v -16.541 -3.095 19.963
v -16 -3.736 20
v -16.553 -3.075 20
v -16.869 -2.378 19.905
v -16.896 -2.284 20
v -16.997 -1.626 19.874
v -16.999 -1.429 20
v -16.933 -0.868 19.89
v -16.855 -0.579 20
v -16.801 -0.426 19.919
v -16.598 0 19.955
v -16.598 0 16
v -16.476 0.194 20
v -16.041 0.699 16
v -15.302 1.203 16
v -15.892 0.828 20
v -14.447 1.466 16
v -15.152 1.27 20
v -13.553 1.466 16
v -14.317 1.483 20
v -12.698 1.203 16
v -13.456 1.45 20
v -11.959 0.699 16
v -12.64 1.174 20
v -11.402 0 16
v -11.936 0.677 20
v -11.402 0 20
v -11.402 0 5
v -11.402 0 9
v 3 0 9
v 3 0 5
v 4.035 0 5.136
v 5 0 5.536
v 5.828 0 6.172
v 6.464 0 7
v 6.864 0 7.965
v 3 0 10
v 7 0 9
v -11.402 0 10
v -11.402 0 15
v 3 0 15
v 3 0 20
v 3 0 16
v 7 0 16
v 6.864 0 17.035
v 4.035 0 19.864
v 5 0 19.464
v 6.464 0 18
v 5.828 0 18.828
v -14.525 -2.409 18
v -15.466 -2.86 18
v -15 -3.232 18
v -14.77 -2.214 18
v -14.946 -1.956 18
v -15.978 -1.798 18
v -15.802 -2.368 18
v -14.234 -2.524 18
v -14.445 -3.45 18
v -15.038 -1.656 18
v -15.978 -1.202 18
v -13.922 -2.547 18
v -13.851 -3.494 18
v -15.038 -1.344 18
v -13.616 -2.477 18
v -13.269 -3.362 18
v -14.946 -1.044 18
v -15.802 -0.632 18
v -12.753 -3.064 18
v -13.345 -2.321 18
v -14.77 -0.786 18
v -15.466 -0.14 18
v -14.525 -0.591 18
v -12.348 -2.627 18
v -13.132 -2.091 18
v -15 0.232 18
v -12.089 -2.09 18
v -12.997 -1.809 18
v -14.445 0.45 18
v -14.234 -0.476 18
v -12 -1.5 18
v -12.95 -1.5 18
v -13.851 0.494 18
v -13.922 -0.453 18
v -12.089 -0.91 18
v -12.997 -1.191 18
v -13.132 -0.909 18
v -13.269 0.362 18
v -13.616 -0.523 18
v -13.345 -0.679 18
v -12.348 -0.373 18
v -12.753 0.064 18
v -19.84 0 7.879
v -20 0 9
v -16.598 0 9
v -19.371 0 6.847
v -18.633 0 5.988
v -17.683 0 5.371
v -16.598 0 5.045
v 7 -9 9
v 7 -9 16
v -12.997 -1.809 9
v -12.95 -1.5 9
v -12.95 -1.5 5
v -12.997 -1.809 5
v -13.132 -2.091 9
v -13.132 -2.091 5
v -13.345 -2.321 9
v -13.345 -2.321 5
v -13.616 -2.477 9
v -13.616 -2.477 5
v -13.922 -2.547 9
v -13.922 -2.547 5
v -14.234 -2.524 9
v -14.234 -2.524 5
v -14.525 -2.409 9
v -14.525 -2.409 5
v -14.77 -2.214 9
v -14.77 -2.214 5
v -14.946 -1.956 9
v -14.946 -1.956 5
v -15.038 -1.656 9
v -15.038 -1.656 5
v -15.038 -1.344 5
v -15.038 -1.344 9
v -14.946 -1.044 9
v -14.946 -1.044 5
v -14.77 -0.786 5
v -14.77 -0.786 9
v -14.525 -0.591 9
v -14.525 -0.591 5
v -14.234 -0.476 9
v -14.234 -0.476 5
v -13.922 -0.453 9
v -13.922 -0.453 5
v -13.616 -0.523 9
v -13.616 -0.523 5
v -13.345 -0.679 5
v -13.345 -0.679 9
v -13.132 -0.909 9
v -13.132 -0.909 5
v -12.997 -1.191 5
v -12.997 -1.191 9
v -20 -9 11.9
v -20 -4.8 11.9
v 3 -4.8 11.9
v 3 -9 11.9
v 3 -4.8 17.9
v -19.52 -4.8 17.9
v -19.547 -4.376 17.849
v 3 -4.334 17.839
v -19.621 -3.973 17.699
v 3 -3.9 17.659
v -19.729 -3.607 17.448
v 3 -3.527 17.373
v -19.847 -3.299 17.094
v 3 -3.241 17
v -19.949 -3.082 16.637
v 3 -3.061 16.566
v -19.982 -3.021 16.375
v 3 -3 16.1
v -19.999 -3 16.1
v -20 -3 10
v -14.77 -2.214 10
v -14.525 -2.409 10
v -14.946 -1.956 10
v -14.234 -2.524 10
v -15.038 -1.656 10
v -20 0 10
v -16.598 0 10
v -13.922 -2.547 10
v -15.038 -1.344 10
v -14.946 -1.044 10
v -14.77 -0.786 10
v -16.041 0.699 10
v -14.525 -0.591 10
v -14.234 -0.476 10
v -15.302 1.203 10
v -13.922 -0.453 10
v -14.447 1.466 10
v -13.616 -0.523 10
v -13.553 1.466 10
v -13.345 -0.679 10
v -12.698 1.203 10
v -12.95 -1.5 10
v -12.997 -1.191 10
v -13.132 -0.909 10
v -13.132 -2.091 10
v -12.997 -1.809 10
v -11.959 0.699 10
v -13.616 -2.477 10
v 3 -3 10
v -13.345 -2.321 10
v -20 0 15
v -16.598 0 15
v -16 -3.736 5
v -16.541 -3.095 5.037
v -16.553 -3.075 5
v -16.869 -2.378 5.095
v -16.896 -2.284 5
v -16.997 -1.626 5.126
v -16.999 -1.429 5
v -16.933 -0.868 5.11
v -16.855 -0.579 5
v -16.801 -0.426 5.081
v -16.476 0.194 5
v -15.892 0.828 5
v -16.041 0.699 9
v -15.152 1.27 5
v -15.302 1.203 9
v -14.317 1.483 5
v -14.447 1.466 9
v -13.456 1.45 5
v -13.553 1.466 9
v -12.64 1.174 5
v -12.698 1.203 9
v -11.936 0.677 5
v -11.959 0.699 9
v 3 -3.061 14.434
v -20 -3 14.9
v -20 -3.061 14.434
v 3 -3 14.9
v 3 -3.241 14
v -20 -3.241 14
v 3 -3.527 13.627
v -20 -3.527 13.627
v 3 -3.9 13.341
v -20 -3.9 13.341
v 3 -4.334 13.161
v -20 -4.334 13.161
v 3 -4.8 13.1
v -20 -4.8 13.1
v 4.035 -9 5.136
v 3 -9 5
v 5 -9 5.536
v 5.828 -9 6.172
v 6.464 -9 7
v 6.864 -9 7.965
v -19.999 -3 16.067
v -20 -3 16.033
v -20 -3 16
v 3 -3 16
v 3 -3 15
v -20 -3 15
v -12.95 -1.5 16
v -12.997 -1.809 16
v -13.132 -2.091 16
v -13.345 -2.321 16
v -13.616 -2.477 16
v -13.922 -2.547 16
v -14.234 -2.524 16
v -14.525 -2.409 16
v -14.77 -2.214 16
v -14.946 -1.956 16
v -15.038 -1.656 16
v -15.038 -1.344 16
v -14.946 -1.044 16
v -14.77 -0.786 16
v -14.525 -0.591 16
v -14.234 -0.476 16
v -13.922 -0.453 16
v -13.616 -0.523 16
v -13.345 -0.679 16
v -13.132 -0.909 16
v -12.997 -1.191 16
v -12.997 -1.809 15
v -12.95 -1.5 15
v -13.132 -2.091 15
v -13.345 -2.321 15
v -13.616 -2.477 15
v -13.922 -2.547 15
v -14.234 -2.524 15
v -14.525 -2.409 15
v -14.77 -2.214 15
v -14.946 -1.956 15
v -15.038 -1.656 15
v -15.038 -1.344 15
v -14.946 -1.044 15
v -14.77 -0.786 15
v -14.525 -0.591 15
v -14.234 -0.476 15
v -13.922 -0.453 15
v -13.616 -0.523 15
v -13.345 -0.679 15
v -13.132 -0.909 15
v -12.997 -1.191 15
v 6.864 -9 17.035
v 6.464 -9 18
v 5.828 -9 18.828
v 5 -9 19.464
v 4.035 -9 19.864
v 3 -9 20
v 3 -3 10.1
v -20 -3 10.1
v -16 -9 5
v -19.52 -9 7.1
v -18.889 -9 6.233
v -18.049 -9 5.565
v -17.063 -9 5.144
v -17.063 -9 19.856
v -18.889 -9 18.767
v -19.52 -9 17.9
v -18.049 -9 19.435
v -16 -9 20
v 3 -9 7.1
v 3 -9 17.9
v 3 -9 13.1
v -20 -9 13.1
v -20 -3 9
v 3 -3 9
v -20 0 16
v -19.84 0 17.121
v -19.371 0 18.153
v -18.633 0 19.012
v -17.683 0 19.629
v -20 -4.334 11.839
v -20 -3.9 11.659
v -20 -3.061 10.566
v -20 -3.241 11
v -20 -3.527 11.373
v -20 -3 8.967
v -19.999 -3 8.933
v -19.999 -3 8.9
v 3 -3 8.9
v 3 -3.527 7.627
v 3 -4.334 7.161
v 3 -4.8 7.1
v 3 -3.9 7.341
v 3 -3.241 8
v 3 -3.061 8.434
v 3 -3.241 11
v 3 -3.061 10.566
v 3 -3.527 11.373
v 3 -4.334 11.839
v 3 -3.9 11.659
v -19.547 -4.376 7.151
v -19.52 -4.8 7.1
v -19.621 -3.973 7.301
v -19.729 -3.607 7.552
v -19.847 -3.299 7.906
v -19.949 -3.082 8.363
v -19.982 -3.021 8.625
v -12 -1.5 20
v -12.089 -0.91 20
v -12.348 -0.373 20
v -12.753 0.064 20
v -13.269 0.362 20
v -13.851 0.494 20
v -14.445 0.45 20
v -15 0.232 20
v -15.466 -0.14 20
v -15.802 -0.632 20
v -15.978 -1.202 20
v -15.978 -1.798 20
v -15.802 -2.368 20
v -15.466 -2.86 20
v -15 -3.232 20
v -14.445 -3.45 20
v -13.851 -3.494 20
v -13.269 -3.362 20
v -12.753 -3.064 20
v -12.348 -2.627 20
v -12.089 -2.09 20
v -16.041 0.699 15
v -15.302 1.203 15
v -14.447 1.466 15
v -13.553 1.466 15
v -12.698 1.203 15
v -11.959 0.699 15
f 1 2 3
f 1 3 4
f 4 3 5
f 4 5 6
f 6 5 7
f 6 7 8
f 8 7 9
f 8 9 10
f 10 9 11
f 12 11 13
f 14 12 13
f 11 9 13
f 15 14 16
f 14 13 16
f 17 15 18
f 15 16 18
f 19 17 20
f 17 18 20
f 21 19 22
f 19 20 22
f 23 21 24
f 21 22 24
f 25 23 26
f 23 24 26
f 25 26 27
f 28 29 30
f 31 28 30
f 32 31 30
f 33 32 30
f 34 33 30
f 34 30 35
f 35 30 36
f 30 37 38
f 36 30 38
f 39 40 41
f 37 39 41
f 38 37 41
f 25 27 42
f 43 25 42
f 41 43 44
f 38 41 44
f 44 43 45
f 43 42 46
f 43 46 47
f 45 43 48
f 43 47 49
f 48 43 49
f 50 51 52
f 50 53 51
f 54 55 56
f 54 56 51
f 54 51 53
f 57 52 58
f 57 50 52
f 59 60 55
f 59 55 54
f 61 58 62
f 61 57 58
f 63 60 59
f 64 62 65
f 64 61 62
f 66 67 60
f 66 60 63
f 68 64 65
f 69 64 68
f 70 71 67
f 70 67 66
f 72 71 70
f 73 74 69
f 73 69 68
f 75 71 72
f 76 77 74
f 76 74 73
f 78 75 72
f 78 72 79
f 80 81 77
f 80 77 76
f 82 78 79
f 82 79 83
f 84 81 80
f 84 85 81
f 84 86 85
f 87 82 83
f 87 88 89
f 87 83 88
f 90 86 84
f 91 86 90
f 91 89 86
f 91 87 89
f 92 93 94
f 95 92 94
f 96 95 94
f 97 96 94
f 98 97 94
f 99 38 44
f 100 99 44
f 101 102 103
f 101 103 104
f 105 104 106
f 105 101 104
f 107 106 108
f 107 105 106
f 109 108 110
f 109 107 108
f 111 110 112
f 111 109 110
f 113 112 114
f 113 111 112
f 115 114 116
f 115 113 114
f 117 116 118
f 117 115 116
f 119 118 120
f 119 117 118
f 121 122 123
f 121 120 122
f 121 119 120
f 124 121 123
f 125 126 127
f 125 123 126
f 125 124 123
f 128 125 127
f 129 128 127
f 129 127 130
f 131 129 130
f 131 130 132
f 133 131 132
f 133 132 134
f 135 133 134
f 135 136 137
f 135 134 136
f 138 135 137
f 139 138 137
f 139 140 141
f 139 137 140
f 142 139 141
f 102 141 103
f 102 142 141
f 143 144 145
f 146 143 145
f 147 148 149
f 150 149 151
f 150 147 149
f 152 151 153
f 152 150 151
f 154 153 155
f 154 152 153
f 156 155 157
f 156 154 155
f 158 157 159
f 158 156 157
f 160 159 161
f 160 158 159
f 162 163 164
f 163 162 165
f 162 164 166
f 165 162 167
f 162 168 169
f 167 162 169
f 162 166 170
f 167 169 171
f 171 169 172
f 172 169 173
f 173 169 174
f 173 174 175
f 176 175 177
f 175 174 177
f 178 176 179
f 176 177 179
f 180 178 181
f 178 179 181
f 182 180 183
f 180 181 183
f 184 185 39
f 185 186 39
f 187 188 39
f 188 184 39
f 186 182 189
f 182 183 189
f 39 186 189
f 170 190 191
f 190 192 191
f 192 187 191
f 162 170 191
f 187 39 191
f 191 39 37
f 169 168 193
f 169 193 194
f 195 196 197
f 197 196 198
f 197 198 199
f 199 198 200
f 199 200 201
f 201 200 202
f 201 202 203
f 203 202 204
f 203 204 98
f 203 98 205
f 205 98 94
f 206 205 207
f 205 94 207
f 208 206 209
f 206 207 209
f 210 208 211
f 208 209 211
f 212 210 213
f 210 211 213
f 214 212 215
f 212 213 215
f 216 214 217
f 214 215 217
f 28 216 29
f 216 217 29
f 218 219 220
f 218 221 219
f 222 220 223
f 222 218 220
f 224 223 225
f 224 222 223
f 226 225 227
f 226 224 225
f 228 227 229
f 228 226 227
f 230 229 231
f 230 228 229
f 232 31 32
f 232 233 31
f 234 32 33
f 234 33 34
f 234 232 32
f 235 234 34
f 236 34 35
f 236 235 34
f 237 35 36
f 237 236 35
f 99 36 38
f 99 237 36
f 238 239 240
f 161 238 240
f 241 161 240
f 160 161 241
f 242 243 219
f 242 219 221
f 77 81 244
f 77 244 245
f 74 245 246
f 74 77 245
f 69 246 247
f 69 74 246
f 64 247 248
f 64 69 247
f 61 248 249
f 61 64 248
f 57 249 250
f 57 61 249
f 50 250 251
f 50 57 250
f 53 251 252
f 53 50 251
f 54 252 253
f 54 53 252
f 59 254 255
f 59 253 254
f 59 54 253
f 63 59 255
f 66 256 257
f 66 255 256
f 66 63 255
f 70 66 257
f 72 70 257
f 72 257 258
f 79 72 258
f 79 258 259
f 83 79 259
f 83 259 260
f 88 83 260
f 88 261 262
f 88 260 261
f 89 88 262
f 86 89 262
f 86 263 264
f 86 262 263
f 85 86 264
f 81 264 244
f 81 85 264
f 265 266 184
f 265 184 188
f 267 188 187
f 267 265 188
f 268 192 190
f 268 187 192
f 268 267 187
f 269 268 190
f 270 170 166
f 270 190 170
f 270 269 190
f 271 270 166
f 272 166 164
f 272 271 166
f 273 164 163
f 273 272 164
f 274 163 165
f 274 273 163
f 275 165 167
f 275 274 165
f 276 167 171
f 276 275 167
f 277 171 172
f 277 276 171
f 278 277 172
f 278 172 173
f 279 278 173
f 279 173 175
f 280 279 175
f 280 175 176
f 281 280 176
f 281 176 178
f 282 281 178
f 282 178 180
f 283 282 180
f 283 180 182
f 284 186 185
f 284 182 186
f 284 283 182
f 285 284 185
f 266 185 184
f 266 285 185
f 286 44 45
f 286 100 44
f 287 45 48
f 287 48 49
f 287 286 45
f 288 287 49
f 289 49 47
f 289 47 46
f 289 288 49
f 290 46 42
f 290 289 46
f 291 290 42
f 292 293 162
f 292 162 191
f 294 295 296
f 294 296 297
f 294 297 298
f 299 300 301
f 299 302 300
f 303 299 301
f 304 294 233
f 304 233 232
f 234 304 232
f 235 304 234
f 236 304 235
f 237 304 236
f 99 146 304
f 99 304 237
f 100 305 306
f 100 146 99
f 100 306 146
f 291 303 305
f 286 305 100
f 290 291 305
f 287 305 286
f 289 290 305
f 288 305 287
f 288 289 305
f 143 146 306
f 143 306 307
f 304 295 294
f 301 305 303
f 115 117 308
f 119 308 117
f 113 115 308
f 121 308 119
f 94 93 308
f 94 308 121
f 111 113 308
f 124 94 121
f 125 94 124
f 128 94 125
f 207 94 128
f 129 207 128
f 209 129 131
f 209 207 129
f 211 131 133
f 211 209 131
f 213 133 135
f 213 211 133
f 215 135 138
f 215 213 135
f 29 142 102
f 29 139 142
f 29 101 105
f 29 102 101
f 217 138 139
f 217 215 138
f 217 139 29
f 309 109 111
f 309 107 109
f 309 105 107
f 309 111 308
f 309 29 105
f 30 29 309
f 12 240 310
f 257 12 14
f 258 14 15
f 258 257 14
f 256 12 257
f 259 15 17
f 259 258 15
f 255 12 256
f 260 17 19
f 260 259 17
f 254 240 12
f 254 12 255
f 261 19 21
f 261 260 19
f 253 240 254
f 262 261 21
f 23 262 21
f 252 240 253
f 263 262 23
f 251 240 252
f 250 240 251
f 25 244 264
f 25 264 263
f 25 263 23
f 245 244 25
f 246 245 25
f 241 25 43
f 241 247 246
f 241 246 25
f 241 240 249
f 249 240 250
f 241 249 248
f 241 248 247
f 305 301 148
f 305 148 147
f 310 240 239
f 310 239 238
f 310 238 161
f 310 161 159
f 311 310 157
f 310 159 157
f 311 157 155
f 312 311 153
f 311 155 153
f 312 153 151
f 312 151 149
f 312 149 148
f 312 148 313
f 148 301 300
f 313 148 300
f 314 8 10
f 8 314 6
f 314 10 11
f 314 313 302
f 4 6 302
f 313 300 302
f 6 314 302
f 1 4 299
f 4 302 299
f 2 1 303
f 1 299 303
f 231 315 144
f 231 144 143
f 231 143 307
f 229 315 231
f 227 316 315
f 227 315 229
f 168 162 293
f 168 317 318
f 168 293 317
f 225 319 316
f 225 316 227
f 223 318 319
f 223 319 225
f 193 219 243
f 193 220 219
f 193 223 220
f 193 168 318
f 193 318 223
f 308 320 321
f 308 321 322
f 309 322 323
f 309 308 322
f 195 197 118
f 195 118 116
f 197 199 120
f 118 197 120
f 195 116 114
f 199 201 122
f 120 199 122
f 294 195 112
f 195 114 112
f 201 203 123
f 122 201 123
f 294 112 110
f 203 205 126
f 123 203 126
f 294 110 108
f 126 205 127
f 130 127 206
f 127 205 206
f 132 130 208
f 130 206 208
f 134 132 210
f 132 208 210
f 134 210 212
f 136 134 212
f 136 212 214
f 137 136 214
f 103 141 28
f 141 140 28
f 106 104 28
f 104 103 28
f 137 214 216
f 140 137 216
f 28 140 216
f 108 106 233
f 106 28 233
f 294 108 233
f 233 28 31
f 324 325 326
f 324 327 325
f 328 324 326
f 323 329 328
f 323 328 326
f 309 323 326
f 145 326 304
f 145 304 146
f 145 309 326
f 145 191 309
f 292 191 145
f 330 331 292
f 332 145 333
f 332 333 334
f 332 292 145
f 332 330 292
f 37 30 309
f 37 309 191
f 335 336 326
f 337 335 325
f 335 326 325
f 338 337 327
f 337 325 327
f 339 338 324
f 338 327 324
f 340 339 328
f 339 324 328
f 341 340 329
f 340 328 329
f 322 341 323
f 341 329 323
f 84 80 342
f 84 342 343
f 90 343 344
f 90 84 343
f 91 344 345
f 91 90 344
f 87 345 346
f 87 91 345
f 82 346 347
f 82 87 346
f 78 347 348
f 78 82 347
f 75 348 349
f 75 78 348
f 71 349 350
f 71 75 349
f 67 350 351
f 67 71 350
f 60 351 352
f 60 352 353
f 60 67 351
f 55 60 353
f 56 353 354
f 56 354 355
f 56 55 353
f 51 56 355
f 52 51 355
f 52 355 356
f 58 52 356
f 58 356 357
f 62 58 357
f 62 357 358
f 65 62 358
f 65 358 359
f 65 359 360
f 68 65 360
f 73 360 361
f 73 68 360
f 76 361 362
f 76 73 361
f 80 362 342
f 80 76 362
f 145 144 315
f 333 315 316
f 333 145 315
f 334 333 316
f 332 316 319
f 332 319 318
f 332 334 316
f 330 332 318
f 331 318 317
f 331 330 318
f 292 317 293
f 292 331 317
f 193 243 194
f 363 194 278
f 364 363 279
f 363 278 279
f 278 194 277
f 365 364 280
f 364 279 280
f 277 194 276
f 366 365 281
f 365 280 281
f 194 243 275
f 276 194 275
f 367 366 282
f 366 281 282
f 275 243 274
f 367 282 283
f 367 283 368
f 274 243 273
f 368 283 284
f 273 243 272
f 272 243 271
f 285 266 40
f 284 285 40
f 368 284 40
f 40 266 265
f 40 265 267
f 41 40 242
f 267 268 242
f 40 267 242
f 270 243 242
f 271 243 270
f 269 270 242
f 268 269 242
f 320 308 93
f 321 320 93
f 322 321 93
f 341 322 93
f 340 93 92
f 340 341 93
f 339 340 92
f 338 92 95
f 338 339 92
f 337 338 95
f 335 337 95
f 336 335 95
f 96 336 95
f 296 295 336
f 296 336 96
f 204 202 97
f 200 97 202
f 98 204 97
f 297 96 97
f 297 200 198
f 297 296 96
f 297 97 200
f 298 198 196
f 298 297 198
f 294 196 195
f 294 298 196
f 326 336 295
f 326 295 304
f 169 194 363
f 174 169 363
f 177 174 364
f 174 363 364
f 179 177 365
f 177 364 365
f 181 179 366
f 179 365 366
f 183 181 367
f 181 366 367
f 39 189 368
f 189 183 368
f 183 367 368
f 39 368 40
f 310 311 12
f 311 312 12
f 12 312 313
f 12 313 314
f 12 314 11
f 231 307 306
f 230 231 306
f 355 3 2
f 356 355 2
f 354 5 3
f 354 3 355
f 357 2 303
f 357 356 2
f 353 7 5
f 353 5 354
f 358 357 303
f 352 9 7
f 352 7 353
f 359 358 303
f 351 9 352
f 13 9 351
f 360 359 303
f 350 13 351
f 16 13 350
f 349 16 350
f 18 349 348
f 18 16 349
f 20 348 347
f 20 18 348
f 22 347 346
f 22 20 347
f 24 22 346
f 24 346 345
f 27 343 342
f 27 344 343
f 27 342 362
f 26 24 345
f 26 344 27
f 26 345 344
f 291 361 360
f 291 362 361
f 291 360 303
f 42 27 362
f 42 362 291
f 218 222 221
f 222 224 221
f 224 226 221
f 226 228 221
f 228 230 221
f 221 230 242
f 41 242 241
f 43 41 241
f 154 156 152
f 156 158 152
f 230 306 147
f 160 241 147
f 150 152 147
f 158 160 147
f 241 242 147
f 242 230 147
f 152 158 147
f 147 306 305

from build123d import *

# Parameters (mm, degrees)
CYLINDER002_R          = 2
CYLINDER002_DEPTH      = 2
CYLINDER_R             = 1.05
CYLINDER_DEPTH         = 20
CYLINDER_ROLL_ANGLE    = 90
RECTANGLE004_W         = 26
RECTANGLE004_H         = 4.8
EXTRUDE005_DEPTH       = 8
RECTANGLE002_W         = 26
RECTANGLE002_H         = 1
EXTRUDE004_DEPTH       = 20
RECTANGLE005_W         = 26
RECTANGLE005_H         = 4.8
EXTRUDE008_DEPTH       = 8
RECTANGLE001_W         = 26
RECTANGLE001_H         = 1
EXTRUDE002_DEPTH       = 20
RECTANGLE_W            = 27
RECTANGLE_H            = 15
EXTRUDE_DEPTH          = 9
FILLET_R               = 4
FILLET001_R            = 1.8
RECTANGLE008_W         = 26
RECTANGLE008_H         = 4.8
EXTRUDE011_DEPTH       = 8
RECTANGLE007_W         = 26
RECTANGLE007_H         = 1
EXTRUDE010_DEPTH       = 20
RECTANGLE009_W         = 26
RECTANGLE009_H         = 4.8
EXTRUDE012_DEPTH       = 8
RECTANGLE006_W         = 26
RECTANGLE006_H         = 1
EXTRUDE009_DEPTH       = 20
CYLINDER001_R          = 3
CYLINDER001_DEPTH      = 15
CYLINDER001_ROLL_ANGLE = 90
CUT002_ROLL_ANGLE      = 90


with BuildPart() as cylinder002:
    # Cylinder002 → Cylinder002 (new body)
    with BuildSketch(Plane(origin=(-14, -1.5, 18), x_dir=(1, 0, 0), z_dir=(0, 0, 1))):
        Circle(CYLINDER002_R)
    extrude(amount=CYLINDER002_DEPTH)


with BuildPart() as cylinder:
    # Cylinder → Cylinder (new body)
    with BuildSketch(Plane.XY):
        Circle(CYLINDER_R)
    extrude(amount=CYLINDER_DEPTH)


with BuildPart() as cylinder_1:
    # Cylinder roll: moved
    add(cylinder.part.rotate(Axis((0, 0, 0), (1, 0, 0)), CYLINDER_ROLL_ANGLE))


with BuildPart() as cylinder_2:
    # Cylinder placement: moved
    add(cylinder_1.part.moved(Location((-14, 21, 1.5))))


with BuildPart() as extrude005:
    # Rectangle004 → Extrude005 (new body)
    with BuildSketch(Plane(origin=(-23, 13.1, 0), x_dir=(1, 0, 0), z_dir=(0, 0, 1))):
        with Locations((13, 2.4)):
            Rectangle(RECTANGLE004_W, RECTANGLE004_H)
    extrude(amount=-EXTRUDE005_DEPTH)


with BuildPart() as extrude005_1:
    # Extrude005 placement: moved
    add(extrude005.part.moved(Location((0, 0, 11))))


with BuildPart() as extrude004:
    # Rectangle002 → Extrude004 (new body)
    with BuildSketch(Plane(origin=(-23, 10, 0), x_dir=(1, 0, 0), z_dir=(0, 0, 1))):
        with Locations((13, -0.5)):
            Rectangle(RECTANGLE002_W, RECTANGLE002_H)
    extrude(amount=EXTRUDE004_DEPTH)


with BuildPart() as extrude004_1:
    # Extrude004 placement: moved
    add(extrude004.part.moved(Location((0, 0, -4))))


with BuildPart() as extrude008:
    # Rectangle005 → Extrude008 (new body)
    with BuildSketch(Plane(origin=(-23, 11.9, 0), x_dir=(1, 0, 0), z_dir=(0, 0, 1))):
        with Locations((13, -2.4)):
            Rectangle(RECTANGLE005_W, RECTANGLE005_H)
    extrude(amount=EXTRUDE008_DEPTH)


with BuildPart() as extrude008_1:
    # Extrude008 placement: moved
    add(extrude008.part.moved(Location((0, 0, 3))))


with BuildPart() as fusion:
    # Rectangle001 → Extrude002 (new body)
    with BuildSketch(Plane(origin=(-23, 16, 0), x_dir=(1, 0, 0), z_dir=(0, 0, 1))):
        with Locations((13, 0.5)):
            Rectangle(RECTANGLE001_W, RECTANGLE001_H)
    extrude(amount=-EXTRUDE002_DEPTH)


with BuildPart() as fusion_1:
    # Extrude002 placement: moved
    add(fusion.part.moved(Location((0, -1, 10))))

    # Fusion: union Extrude005, Extrude004, Extrude008
    add(extrude005_1.part)
    add(extrude004_1.part)
    add(extrude008_1.part)


with BuildPart() as fillet001:
    # Rectangle → Extrude (new body)
    with BuildSketch(Plane(origin=(-20, 20, 0), x_dir=(1, 0, 0), z_dir=(0, 0, 1))):
        with Locations((13.5, -7.5)):
            Rectangle(RECTANGLE_W, RECTANGLE_H)
    extrude(amount=EXTRUDE_DEPTH)

    # Fillet
    fillet_edges = [fillet001.edges().sort_by_distance(p)[0] for p in [
        (-20, 20, 4.5),
        (7, 20, 4.5),
        (7, 5, 4.5),
        (-20, 5, 4.5),
    ]]
    fillet(fillet_edges, radius=FILLET_R)

    # Cut: cut Fusion
    add(fusion_1.part, mode=Mode.SUBTRACT)

    # Fillet001
    fillet001_edges = [fillet001.edges().sort_by_distance(p)[0] for p in [
        (-8.259972, 17.9, 3),
        (-8.259972, 7.1, 3),
        (-8.5, 11.9, 3),
        (-8.5, 13.1, 3),
    ]]
    fillet(fillet001_edges, radius=FILLET001_R)


with BuildPart() as extrude011:
    # Rectangle008 → Extrude011 (new body)
    with BuildSketch(Plane(origin=(-23, 13.1, 0), x_dir=(1, 0, 0), z_dir=(0, 0, 1))):
        with Locations((13, 2.4)):
            Rectangle(RECTANGLE008_W, RECTANGLE008_H)
    extrude(amount=-EXTRUDE011_DEPTH)


with BuildPart() as extrude011_1:
    # Extrude011 placement: moved
    add(extrude011.part.moved(Location((0, 0, 11))))


with BuildPart() as extrude010:
    # Rectangle007 → Extrude010 (new body)
    with BuildSketch(Plane(origin=(-23, 10, 0), x_dir=(1, 0, 0), z_dir=(0, 0, 1))):
        with Locations((13, -0.5)):
            Rectangle(RECTANGLE007_W, RECTANGLE007_H)
    extrude(amount=EXTRUDE010_DEPTH)


with BuildPart() as extrude010_1:
    # Extrude010 placement: moved
    add(extrude010.part.moved(Location((0, 0, -4))))


with BuildPart() as extrude012:
    # Rectangle009 → Extrude012 (new body)
    with BuildSketch(Plane(origin=(-23, 11.9, 0), x_dir=(1, 0, 0), z_dir=(0, 0, 1))):
        with Locations((13, -2.4)):
            Rectangle(RECTANGLE009_W, RECTANGLE009_H)
    extrude(amount=EXTRUDE012_DEPTH)


with BuildPart() as extrude012_1:
    # Extrude012 placement: moved
    add(extrude012.part.moved(Location((0, 0, 3))))


with BuildPart() as fusion001:
    # Rectangle006 → Extrude009 (new body)
    with BuildSketch(Plane(origin=(-23, 16, 0), x_dir=(1, 0, 0), z_dir=(0, 0, 1))):
        with Locations((13, 0.5)):
            Rectangle(RECTANGLE006_W, RECTANGLE006_H)
    extrude(amount=-EXTRUDE009_DEPTH)


with BuildPart() as fusion001_1:
    # Extrude009 placement: moved
    add(fusion001.part.moved(Location((0, -1, 10))))

    # Fusion001: union Extrude011, Extrude010, Extrude012
    add(extrude011_1.part)
    add(extrude010_1.part)
    add(extrude012_1.part)


with BuildPart() as cut003:
    # Cylinder001 → Cylinder001 (new body)
    with BuildSketch(Plane.XY):
        Circle(CYLINDER001_R)
    extrude(amount=CYLINDER001_DEPTH)


with BuildPart() as cut003_1:
    # Cylinder001 roll: moved
    add(cut003.part.rotate(Axis((0, 0, 0), (1, 0, 0)), CYLINDER001_ROLL_ANGLE))


with BuildPart() as cut003_2:
    # Cylinder001 placement: moved
    add(cut003_1.part.moved(Location((-14, 20, 1.5))))

    # Cut001: cut Fusion001
    add(fusion001_1.part, mode=Mode.SUBTRACT)

    # Fusion002: union Fillet001
    add(fillet001.part)

    # Cut002: cut Cylinder
    add(cylinder_2.part, mode=Mode.SUBTRACT)


with BuildPart() as cut003_3:
    # Cut002 roll: moved
    add(cut003_2.part.rotate(Axis((0, 0, 0), (1, 0, 0)), CUT002_ROLL_ANGLE))


with BuildPart() as cut003_4:
    # Cut002 placement: moved
    add(cut003_3.part)

    # Cut003: cut Cylinder002
    add(cylinder002.part, mode=Mode.SUBTRACT)


solid = cut003_4.part
